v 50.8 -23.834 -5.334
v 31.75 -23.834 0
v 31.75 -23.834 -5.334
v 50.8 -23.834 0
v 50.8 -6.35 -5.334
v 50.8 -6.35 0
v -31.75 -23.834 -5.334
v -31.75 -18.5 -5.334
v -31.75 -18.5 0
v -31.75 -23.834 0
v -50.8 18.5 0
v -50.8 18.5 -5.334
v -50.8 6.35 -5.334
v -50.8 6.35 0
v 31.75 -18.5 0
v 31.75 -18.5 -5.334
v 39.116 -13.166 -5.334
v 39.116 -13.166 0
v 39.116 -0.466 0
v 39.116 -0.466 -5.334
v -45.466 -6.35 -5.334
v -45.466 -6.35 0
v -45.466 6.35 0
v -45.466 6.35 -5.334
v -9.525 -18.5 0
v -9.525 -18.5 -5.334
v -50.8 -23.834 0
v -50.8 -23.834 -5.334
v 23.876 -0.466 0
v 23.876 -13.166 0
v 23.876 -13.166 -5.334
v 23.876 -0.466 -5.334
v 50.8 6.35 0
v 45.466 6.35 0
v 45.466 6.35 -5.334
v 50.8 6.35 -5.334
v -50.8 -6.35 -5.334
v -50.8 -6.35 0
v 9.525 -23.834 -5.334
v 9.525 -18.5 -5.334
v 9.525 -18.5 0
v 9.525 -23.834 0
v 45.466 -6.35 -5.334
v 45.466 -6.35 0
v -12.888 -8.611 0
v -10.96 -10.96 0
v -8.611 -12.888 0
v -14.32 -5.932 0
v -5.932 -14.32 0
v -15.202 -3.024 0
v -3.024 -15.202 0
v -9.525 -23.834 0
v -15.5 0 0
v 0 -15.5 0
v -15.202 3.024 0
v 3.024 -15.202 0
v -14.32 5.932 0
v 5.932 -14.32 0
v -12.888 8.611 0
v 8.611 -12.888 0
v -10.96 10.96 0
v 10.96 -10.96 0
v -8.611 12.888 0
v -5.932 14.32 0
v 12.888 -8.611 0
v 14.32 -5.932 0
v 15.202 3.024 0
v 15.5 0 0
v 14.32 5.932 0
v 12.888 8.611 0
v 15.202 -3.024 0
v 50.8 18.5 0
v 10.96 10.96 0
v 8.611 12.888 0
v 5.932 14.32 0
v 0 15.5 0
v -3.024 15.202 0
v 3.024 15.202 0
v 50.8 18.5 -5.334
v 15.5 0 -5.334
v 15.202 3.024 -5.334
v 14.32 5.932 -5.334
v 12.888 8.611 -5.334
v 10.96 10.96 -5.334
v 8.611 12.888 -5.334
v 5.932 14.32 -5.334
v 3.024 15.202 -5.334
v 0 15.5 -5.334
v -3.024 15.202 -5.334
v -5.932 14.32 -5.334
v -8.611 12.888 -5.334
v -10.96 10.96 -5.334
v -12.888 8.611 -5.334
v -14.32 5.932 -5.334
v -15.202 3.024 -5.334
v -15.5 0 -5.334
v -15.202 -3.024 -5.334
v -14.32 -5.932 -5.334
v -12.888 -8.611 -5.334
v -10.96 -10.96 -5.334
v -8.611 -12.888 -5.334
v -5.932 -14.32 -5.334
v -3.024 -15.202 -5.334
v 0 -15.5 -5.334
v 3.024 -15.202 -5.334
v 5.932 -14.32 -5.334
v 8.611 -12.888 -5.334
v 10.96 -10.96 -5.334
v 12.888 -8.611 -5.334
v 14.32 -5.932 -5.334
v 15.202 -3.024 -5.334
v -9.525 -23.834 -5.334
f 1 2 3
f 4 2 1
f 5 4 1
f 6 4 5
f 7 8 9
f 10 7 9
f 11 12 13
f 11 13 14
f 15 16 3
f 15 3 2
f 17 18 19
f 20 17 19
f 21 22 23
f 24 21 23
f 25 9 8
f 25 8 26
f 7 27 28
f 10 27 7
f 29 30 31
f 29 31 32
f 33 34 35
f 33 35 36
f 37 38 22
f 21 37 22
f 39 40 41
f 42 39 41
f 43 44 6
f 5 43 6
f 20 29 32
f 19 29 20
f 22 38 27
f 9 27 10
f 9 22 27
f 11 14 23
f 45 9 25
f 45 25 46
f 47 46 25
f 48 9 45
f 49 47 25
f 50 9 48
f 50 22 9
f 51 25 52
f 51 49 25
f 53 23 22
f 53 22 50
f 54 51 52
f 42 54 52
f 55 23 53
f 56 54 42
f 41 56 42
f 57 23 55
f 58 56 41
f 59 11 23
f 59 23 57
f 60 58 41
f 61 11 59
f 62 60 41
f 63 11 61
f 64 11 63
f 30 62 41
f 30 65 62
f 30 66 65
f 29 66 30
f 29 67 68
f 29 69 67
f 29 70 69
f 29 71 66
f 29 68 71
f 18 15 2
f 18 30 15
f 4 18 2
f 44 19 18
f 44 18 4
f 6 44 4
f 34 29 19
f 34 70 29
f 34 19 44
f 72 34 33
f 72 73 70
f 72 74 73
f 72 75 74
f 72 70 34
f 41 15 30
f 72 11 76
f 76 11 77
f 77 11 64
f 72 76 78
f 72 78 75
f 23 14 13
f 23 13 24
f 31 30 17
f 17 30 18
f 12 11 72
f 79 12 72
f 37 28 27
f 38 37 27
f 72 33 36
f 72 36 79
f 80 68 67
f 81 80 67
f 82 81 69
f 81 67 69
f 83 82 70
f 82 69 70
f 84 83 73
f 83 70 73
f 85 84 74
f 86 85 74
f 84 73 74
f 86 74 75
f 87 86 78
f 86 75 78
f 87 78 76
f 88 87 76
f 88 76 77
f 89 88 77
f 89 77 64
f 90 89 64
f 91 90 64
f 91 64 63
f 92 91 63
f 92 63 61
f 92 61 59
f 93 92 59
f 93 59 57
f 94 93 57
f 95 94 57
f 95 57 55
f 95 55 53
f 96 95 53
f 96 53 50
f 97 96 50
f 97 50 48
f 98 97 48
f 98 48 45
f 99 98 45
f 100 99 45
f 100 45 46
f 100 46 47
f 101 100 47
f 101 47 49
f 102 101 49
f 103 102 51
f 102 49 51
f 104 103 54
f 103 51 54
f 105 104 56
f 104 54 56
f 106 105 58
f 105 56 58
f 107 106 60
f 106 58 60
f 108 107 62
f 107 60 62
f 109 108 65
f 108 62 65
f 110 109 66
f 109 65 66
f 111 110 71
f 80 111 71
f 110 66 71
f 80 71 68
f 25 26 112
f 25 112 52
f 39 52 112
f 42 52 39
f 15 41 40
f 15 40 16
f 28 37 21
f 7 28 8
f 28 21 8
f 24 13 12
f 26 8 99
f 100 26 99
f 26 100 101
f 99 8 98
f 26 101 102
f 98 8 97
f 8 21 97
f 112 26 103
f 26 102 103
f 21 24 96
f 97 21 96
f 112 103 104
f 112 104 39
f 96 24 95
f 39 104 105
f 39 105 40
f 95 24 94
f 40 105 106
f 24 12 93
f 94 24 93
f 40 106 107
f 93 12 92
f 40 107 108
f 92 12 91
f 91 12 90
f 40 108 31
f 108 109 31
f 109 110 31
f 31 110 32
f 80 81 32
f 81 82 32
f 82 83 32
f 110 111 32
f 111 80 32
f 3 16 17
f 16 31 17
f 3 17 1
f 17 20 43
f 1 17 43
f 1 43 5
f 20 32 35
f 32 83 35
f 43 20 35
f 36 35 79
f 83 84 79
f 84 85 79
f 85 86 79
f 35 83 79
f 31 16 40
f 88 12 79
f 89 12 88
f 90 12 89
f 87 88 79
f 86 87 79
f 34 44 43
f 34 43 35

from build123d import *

# Parameters (mm, degrees)
SKETCH1_W           = 101.6
SKETCH1_H           = 37
BOSS_EXTRUDE1_DEPTH = 5.334
SKETCH2_R           = 15.5
MOTOR_HOLE_DEPTH    = 55.326251076
SKETCH4_W           = 19.05
SKETCH4_H           = 5.334
BOTTOM_TABS_DEPTH   = 5.334
SKETCH5_W           = 5.334
SKETCH5_H           = 12.7
CUT_EXTRUDE1_DEPTH  = 57.366223148
SKETCH6_W           = 15.24
SKETCH6_H           = 12.7
CUT_EXTRUDE2_DEPTH  = 77.262693919


with BuildPart() as part:
    # Sketch1 → Boss-Extrude1 (new body)
    with BuildSketch(Plane.XY):
        Rectangle(SKETCH1_W, SKETCH1_H)
    extrude(amount=-BOSS_EXTRUDE1_DEPTH)

    # Sketch2 → Motor Hole (cut, through all)
    with BuildSketch(Plane.XY):
        Circle(SKETCH2_R)
    extrude(amount=-MOTOR_HOLE_DEPTH, mode=Mode.SUBTRACT)

    # Sketch4 → Bottom Tabs (add)
    with BuildSketch(Plane.XZ.offset(18.5)):
        with Locations((-41.275, -2.667)):
            Rectangle(SKETCH4_W, SKETCH4_H)
        with Locations((0, -2.667)):
            Rectangle(SKETCH4_W, SKETCH4_H)
        with Locations((41.275, -2.667)):
            Rectangle(SKETCH4_W, SKETCH4_H)
    extrude(amount=BOTTOM_TABS_DEPTH)

    # Sketch5 → Cut-Extrude1 (cut, through all)
    with BuildSketch(Plane.XY):
        with Locations((-48.133, 0)):
            Rectangle(SKETCH5_W, SKETCH5_H)
        with Locations((48.133, 0)):
            Rectangle(SKETCH5_W, SKETCH5_H)
    extrude(amount=-CUT_EXTRUDE1_DEPTH, mode=Mode.SUBTRACT)

    # Sketch6 → Cut-Extrude2 (cut, through all)
    with BuildSketch(Plane(origin=(16.243120564, -7.106483242, 20.4638), x_dir=(1, 0, 0), z_dir=(0, 0, 1))):
        with Locations((15.252879436, 0.290483242)):
            Rectangle(SKETCH6_W, SKETCH6_H)
    extrude(amount=-CUT_EXTRUDE2_DEPTH, mode=Mode.SUBTRACT)


solid = part.part
